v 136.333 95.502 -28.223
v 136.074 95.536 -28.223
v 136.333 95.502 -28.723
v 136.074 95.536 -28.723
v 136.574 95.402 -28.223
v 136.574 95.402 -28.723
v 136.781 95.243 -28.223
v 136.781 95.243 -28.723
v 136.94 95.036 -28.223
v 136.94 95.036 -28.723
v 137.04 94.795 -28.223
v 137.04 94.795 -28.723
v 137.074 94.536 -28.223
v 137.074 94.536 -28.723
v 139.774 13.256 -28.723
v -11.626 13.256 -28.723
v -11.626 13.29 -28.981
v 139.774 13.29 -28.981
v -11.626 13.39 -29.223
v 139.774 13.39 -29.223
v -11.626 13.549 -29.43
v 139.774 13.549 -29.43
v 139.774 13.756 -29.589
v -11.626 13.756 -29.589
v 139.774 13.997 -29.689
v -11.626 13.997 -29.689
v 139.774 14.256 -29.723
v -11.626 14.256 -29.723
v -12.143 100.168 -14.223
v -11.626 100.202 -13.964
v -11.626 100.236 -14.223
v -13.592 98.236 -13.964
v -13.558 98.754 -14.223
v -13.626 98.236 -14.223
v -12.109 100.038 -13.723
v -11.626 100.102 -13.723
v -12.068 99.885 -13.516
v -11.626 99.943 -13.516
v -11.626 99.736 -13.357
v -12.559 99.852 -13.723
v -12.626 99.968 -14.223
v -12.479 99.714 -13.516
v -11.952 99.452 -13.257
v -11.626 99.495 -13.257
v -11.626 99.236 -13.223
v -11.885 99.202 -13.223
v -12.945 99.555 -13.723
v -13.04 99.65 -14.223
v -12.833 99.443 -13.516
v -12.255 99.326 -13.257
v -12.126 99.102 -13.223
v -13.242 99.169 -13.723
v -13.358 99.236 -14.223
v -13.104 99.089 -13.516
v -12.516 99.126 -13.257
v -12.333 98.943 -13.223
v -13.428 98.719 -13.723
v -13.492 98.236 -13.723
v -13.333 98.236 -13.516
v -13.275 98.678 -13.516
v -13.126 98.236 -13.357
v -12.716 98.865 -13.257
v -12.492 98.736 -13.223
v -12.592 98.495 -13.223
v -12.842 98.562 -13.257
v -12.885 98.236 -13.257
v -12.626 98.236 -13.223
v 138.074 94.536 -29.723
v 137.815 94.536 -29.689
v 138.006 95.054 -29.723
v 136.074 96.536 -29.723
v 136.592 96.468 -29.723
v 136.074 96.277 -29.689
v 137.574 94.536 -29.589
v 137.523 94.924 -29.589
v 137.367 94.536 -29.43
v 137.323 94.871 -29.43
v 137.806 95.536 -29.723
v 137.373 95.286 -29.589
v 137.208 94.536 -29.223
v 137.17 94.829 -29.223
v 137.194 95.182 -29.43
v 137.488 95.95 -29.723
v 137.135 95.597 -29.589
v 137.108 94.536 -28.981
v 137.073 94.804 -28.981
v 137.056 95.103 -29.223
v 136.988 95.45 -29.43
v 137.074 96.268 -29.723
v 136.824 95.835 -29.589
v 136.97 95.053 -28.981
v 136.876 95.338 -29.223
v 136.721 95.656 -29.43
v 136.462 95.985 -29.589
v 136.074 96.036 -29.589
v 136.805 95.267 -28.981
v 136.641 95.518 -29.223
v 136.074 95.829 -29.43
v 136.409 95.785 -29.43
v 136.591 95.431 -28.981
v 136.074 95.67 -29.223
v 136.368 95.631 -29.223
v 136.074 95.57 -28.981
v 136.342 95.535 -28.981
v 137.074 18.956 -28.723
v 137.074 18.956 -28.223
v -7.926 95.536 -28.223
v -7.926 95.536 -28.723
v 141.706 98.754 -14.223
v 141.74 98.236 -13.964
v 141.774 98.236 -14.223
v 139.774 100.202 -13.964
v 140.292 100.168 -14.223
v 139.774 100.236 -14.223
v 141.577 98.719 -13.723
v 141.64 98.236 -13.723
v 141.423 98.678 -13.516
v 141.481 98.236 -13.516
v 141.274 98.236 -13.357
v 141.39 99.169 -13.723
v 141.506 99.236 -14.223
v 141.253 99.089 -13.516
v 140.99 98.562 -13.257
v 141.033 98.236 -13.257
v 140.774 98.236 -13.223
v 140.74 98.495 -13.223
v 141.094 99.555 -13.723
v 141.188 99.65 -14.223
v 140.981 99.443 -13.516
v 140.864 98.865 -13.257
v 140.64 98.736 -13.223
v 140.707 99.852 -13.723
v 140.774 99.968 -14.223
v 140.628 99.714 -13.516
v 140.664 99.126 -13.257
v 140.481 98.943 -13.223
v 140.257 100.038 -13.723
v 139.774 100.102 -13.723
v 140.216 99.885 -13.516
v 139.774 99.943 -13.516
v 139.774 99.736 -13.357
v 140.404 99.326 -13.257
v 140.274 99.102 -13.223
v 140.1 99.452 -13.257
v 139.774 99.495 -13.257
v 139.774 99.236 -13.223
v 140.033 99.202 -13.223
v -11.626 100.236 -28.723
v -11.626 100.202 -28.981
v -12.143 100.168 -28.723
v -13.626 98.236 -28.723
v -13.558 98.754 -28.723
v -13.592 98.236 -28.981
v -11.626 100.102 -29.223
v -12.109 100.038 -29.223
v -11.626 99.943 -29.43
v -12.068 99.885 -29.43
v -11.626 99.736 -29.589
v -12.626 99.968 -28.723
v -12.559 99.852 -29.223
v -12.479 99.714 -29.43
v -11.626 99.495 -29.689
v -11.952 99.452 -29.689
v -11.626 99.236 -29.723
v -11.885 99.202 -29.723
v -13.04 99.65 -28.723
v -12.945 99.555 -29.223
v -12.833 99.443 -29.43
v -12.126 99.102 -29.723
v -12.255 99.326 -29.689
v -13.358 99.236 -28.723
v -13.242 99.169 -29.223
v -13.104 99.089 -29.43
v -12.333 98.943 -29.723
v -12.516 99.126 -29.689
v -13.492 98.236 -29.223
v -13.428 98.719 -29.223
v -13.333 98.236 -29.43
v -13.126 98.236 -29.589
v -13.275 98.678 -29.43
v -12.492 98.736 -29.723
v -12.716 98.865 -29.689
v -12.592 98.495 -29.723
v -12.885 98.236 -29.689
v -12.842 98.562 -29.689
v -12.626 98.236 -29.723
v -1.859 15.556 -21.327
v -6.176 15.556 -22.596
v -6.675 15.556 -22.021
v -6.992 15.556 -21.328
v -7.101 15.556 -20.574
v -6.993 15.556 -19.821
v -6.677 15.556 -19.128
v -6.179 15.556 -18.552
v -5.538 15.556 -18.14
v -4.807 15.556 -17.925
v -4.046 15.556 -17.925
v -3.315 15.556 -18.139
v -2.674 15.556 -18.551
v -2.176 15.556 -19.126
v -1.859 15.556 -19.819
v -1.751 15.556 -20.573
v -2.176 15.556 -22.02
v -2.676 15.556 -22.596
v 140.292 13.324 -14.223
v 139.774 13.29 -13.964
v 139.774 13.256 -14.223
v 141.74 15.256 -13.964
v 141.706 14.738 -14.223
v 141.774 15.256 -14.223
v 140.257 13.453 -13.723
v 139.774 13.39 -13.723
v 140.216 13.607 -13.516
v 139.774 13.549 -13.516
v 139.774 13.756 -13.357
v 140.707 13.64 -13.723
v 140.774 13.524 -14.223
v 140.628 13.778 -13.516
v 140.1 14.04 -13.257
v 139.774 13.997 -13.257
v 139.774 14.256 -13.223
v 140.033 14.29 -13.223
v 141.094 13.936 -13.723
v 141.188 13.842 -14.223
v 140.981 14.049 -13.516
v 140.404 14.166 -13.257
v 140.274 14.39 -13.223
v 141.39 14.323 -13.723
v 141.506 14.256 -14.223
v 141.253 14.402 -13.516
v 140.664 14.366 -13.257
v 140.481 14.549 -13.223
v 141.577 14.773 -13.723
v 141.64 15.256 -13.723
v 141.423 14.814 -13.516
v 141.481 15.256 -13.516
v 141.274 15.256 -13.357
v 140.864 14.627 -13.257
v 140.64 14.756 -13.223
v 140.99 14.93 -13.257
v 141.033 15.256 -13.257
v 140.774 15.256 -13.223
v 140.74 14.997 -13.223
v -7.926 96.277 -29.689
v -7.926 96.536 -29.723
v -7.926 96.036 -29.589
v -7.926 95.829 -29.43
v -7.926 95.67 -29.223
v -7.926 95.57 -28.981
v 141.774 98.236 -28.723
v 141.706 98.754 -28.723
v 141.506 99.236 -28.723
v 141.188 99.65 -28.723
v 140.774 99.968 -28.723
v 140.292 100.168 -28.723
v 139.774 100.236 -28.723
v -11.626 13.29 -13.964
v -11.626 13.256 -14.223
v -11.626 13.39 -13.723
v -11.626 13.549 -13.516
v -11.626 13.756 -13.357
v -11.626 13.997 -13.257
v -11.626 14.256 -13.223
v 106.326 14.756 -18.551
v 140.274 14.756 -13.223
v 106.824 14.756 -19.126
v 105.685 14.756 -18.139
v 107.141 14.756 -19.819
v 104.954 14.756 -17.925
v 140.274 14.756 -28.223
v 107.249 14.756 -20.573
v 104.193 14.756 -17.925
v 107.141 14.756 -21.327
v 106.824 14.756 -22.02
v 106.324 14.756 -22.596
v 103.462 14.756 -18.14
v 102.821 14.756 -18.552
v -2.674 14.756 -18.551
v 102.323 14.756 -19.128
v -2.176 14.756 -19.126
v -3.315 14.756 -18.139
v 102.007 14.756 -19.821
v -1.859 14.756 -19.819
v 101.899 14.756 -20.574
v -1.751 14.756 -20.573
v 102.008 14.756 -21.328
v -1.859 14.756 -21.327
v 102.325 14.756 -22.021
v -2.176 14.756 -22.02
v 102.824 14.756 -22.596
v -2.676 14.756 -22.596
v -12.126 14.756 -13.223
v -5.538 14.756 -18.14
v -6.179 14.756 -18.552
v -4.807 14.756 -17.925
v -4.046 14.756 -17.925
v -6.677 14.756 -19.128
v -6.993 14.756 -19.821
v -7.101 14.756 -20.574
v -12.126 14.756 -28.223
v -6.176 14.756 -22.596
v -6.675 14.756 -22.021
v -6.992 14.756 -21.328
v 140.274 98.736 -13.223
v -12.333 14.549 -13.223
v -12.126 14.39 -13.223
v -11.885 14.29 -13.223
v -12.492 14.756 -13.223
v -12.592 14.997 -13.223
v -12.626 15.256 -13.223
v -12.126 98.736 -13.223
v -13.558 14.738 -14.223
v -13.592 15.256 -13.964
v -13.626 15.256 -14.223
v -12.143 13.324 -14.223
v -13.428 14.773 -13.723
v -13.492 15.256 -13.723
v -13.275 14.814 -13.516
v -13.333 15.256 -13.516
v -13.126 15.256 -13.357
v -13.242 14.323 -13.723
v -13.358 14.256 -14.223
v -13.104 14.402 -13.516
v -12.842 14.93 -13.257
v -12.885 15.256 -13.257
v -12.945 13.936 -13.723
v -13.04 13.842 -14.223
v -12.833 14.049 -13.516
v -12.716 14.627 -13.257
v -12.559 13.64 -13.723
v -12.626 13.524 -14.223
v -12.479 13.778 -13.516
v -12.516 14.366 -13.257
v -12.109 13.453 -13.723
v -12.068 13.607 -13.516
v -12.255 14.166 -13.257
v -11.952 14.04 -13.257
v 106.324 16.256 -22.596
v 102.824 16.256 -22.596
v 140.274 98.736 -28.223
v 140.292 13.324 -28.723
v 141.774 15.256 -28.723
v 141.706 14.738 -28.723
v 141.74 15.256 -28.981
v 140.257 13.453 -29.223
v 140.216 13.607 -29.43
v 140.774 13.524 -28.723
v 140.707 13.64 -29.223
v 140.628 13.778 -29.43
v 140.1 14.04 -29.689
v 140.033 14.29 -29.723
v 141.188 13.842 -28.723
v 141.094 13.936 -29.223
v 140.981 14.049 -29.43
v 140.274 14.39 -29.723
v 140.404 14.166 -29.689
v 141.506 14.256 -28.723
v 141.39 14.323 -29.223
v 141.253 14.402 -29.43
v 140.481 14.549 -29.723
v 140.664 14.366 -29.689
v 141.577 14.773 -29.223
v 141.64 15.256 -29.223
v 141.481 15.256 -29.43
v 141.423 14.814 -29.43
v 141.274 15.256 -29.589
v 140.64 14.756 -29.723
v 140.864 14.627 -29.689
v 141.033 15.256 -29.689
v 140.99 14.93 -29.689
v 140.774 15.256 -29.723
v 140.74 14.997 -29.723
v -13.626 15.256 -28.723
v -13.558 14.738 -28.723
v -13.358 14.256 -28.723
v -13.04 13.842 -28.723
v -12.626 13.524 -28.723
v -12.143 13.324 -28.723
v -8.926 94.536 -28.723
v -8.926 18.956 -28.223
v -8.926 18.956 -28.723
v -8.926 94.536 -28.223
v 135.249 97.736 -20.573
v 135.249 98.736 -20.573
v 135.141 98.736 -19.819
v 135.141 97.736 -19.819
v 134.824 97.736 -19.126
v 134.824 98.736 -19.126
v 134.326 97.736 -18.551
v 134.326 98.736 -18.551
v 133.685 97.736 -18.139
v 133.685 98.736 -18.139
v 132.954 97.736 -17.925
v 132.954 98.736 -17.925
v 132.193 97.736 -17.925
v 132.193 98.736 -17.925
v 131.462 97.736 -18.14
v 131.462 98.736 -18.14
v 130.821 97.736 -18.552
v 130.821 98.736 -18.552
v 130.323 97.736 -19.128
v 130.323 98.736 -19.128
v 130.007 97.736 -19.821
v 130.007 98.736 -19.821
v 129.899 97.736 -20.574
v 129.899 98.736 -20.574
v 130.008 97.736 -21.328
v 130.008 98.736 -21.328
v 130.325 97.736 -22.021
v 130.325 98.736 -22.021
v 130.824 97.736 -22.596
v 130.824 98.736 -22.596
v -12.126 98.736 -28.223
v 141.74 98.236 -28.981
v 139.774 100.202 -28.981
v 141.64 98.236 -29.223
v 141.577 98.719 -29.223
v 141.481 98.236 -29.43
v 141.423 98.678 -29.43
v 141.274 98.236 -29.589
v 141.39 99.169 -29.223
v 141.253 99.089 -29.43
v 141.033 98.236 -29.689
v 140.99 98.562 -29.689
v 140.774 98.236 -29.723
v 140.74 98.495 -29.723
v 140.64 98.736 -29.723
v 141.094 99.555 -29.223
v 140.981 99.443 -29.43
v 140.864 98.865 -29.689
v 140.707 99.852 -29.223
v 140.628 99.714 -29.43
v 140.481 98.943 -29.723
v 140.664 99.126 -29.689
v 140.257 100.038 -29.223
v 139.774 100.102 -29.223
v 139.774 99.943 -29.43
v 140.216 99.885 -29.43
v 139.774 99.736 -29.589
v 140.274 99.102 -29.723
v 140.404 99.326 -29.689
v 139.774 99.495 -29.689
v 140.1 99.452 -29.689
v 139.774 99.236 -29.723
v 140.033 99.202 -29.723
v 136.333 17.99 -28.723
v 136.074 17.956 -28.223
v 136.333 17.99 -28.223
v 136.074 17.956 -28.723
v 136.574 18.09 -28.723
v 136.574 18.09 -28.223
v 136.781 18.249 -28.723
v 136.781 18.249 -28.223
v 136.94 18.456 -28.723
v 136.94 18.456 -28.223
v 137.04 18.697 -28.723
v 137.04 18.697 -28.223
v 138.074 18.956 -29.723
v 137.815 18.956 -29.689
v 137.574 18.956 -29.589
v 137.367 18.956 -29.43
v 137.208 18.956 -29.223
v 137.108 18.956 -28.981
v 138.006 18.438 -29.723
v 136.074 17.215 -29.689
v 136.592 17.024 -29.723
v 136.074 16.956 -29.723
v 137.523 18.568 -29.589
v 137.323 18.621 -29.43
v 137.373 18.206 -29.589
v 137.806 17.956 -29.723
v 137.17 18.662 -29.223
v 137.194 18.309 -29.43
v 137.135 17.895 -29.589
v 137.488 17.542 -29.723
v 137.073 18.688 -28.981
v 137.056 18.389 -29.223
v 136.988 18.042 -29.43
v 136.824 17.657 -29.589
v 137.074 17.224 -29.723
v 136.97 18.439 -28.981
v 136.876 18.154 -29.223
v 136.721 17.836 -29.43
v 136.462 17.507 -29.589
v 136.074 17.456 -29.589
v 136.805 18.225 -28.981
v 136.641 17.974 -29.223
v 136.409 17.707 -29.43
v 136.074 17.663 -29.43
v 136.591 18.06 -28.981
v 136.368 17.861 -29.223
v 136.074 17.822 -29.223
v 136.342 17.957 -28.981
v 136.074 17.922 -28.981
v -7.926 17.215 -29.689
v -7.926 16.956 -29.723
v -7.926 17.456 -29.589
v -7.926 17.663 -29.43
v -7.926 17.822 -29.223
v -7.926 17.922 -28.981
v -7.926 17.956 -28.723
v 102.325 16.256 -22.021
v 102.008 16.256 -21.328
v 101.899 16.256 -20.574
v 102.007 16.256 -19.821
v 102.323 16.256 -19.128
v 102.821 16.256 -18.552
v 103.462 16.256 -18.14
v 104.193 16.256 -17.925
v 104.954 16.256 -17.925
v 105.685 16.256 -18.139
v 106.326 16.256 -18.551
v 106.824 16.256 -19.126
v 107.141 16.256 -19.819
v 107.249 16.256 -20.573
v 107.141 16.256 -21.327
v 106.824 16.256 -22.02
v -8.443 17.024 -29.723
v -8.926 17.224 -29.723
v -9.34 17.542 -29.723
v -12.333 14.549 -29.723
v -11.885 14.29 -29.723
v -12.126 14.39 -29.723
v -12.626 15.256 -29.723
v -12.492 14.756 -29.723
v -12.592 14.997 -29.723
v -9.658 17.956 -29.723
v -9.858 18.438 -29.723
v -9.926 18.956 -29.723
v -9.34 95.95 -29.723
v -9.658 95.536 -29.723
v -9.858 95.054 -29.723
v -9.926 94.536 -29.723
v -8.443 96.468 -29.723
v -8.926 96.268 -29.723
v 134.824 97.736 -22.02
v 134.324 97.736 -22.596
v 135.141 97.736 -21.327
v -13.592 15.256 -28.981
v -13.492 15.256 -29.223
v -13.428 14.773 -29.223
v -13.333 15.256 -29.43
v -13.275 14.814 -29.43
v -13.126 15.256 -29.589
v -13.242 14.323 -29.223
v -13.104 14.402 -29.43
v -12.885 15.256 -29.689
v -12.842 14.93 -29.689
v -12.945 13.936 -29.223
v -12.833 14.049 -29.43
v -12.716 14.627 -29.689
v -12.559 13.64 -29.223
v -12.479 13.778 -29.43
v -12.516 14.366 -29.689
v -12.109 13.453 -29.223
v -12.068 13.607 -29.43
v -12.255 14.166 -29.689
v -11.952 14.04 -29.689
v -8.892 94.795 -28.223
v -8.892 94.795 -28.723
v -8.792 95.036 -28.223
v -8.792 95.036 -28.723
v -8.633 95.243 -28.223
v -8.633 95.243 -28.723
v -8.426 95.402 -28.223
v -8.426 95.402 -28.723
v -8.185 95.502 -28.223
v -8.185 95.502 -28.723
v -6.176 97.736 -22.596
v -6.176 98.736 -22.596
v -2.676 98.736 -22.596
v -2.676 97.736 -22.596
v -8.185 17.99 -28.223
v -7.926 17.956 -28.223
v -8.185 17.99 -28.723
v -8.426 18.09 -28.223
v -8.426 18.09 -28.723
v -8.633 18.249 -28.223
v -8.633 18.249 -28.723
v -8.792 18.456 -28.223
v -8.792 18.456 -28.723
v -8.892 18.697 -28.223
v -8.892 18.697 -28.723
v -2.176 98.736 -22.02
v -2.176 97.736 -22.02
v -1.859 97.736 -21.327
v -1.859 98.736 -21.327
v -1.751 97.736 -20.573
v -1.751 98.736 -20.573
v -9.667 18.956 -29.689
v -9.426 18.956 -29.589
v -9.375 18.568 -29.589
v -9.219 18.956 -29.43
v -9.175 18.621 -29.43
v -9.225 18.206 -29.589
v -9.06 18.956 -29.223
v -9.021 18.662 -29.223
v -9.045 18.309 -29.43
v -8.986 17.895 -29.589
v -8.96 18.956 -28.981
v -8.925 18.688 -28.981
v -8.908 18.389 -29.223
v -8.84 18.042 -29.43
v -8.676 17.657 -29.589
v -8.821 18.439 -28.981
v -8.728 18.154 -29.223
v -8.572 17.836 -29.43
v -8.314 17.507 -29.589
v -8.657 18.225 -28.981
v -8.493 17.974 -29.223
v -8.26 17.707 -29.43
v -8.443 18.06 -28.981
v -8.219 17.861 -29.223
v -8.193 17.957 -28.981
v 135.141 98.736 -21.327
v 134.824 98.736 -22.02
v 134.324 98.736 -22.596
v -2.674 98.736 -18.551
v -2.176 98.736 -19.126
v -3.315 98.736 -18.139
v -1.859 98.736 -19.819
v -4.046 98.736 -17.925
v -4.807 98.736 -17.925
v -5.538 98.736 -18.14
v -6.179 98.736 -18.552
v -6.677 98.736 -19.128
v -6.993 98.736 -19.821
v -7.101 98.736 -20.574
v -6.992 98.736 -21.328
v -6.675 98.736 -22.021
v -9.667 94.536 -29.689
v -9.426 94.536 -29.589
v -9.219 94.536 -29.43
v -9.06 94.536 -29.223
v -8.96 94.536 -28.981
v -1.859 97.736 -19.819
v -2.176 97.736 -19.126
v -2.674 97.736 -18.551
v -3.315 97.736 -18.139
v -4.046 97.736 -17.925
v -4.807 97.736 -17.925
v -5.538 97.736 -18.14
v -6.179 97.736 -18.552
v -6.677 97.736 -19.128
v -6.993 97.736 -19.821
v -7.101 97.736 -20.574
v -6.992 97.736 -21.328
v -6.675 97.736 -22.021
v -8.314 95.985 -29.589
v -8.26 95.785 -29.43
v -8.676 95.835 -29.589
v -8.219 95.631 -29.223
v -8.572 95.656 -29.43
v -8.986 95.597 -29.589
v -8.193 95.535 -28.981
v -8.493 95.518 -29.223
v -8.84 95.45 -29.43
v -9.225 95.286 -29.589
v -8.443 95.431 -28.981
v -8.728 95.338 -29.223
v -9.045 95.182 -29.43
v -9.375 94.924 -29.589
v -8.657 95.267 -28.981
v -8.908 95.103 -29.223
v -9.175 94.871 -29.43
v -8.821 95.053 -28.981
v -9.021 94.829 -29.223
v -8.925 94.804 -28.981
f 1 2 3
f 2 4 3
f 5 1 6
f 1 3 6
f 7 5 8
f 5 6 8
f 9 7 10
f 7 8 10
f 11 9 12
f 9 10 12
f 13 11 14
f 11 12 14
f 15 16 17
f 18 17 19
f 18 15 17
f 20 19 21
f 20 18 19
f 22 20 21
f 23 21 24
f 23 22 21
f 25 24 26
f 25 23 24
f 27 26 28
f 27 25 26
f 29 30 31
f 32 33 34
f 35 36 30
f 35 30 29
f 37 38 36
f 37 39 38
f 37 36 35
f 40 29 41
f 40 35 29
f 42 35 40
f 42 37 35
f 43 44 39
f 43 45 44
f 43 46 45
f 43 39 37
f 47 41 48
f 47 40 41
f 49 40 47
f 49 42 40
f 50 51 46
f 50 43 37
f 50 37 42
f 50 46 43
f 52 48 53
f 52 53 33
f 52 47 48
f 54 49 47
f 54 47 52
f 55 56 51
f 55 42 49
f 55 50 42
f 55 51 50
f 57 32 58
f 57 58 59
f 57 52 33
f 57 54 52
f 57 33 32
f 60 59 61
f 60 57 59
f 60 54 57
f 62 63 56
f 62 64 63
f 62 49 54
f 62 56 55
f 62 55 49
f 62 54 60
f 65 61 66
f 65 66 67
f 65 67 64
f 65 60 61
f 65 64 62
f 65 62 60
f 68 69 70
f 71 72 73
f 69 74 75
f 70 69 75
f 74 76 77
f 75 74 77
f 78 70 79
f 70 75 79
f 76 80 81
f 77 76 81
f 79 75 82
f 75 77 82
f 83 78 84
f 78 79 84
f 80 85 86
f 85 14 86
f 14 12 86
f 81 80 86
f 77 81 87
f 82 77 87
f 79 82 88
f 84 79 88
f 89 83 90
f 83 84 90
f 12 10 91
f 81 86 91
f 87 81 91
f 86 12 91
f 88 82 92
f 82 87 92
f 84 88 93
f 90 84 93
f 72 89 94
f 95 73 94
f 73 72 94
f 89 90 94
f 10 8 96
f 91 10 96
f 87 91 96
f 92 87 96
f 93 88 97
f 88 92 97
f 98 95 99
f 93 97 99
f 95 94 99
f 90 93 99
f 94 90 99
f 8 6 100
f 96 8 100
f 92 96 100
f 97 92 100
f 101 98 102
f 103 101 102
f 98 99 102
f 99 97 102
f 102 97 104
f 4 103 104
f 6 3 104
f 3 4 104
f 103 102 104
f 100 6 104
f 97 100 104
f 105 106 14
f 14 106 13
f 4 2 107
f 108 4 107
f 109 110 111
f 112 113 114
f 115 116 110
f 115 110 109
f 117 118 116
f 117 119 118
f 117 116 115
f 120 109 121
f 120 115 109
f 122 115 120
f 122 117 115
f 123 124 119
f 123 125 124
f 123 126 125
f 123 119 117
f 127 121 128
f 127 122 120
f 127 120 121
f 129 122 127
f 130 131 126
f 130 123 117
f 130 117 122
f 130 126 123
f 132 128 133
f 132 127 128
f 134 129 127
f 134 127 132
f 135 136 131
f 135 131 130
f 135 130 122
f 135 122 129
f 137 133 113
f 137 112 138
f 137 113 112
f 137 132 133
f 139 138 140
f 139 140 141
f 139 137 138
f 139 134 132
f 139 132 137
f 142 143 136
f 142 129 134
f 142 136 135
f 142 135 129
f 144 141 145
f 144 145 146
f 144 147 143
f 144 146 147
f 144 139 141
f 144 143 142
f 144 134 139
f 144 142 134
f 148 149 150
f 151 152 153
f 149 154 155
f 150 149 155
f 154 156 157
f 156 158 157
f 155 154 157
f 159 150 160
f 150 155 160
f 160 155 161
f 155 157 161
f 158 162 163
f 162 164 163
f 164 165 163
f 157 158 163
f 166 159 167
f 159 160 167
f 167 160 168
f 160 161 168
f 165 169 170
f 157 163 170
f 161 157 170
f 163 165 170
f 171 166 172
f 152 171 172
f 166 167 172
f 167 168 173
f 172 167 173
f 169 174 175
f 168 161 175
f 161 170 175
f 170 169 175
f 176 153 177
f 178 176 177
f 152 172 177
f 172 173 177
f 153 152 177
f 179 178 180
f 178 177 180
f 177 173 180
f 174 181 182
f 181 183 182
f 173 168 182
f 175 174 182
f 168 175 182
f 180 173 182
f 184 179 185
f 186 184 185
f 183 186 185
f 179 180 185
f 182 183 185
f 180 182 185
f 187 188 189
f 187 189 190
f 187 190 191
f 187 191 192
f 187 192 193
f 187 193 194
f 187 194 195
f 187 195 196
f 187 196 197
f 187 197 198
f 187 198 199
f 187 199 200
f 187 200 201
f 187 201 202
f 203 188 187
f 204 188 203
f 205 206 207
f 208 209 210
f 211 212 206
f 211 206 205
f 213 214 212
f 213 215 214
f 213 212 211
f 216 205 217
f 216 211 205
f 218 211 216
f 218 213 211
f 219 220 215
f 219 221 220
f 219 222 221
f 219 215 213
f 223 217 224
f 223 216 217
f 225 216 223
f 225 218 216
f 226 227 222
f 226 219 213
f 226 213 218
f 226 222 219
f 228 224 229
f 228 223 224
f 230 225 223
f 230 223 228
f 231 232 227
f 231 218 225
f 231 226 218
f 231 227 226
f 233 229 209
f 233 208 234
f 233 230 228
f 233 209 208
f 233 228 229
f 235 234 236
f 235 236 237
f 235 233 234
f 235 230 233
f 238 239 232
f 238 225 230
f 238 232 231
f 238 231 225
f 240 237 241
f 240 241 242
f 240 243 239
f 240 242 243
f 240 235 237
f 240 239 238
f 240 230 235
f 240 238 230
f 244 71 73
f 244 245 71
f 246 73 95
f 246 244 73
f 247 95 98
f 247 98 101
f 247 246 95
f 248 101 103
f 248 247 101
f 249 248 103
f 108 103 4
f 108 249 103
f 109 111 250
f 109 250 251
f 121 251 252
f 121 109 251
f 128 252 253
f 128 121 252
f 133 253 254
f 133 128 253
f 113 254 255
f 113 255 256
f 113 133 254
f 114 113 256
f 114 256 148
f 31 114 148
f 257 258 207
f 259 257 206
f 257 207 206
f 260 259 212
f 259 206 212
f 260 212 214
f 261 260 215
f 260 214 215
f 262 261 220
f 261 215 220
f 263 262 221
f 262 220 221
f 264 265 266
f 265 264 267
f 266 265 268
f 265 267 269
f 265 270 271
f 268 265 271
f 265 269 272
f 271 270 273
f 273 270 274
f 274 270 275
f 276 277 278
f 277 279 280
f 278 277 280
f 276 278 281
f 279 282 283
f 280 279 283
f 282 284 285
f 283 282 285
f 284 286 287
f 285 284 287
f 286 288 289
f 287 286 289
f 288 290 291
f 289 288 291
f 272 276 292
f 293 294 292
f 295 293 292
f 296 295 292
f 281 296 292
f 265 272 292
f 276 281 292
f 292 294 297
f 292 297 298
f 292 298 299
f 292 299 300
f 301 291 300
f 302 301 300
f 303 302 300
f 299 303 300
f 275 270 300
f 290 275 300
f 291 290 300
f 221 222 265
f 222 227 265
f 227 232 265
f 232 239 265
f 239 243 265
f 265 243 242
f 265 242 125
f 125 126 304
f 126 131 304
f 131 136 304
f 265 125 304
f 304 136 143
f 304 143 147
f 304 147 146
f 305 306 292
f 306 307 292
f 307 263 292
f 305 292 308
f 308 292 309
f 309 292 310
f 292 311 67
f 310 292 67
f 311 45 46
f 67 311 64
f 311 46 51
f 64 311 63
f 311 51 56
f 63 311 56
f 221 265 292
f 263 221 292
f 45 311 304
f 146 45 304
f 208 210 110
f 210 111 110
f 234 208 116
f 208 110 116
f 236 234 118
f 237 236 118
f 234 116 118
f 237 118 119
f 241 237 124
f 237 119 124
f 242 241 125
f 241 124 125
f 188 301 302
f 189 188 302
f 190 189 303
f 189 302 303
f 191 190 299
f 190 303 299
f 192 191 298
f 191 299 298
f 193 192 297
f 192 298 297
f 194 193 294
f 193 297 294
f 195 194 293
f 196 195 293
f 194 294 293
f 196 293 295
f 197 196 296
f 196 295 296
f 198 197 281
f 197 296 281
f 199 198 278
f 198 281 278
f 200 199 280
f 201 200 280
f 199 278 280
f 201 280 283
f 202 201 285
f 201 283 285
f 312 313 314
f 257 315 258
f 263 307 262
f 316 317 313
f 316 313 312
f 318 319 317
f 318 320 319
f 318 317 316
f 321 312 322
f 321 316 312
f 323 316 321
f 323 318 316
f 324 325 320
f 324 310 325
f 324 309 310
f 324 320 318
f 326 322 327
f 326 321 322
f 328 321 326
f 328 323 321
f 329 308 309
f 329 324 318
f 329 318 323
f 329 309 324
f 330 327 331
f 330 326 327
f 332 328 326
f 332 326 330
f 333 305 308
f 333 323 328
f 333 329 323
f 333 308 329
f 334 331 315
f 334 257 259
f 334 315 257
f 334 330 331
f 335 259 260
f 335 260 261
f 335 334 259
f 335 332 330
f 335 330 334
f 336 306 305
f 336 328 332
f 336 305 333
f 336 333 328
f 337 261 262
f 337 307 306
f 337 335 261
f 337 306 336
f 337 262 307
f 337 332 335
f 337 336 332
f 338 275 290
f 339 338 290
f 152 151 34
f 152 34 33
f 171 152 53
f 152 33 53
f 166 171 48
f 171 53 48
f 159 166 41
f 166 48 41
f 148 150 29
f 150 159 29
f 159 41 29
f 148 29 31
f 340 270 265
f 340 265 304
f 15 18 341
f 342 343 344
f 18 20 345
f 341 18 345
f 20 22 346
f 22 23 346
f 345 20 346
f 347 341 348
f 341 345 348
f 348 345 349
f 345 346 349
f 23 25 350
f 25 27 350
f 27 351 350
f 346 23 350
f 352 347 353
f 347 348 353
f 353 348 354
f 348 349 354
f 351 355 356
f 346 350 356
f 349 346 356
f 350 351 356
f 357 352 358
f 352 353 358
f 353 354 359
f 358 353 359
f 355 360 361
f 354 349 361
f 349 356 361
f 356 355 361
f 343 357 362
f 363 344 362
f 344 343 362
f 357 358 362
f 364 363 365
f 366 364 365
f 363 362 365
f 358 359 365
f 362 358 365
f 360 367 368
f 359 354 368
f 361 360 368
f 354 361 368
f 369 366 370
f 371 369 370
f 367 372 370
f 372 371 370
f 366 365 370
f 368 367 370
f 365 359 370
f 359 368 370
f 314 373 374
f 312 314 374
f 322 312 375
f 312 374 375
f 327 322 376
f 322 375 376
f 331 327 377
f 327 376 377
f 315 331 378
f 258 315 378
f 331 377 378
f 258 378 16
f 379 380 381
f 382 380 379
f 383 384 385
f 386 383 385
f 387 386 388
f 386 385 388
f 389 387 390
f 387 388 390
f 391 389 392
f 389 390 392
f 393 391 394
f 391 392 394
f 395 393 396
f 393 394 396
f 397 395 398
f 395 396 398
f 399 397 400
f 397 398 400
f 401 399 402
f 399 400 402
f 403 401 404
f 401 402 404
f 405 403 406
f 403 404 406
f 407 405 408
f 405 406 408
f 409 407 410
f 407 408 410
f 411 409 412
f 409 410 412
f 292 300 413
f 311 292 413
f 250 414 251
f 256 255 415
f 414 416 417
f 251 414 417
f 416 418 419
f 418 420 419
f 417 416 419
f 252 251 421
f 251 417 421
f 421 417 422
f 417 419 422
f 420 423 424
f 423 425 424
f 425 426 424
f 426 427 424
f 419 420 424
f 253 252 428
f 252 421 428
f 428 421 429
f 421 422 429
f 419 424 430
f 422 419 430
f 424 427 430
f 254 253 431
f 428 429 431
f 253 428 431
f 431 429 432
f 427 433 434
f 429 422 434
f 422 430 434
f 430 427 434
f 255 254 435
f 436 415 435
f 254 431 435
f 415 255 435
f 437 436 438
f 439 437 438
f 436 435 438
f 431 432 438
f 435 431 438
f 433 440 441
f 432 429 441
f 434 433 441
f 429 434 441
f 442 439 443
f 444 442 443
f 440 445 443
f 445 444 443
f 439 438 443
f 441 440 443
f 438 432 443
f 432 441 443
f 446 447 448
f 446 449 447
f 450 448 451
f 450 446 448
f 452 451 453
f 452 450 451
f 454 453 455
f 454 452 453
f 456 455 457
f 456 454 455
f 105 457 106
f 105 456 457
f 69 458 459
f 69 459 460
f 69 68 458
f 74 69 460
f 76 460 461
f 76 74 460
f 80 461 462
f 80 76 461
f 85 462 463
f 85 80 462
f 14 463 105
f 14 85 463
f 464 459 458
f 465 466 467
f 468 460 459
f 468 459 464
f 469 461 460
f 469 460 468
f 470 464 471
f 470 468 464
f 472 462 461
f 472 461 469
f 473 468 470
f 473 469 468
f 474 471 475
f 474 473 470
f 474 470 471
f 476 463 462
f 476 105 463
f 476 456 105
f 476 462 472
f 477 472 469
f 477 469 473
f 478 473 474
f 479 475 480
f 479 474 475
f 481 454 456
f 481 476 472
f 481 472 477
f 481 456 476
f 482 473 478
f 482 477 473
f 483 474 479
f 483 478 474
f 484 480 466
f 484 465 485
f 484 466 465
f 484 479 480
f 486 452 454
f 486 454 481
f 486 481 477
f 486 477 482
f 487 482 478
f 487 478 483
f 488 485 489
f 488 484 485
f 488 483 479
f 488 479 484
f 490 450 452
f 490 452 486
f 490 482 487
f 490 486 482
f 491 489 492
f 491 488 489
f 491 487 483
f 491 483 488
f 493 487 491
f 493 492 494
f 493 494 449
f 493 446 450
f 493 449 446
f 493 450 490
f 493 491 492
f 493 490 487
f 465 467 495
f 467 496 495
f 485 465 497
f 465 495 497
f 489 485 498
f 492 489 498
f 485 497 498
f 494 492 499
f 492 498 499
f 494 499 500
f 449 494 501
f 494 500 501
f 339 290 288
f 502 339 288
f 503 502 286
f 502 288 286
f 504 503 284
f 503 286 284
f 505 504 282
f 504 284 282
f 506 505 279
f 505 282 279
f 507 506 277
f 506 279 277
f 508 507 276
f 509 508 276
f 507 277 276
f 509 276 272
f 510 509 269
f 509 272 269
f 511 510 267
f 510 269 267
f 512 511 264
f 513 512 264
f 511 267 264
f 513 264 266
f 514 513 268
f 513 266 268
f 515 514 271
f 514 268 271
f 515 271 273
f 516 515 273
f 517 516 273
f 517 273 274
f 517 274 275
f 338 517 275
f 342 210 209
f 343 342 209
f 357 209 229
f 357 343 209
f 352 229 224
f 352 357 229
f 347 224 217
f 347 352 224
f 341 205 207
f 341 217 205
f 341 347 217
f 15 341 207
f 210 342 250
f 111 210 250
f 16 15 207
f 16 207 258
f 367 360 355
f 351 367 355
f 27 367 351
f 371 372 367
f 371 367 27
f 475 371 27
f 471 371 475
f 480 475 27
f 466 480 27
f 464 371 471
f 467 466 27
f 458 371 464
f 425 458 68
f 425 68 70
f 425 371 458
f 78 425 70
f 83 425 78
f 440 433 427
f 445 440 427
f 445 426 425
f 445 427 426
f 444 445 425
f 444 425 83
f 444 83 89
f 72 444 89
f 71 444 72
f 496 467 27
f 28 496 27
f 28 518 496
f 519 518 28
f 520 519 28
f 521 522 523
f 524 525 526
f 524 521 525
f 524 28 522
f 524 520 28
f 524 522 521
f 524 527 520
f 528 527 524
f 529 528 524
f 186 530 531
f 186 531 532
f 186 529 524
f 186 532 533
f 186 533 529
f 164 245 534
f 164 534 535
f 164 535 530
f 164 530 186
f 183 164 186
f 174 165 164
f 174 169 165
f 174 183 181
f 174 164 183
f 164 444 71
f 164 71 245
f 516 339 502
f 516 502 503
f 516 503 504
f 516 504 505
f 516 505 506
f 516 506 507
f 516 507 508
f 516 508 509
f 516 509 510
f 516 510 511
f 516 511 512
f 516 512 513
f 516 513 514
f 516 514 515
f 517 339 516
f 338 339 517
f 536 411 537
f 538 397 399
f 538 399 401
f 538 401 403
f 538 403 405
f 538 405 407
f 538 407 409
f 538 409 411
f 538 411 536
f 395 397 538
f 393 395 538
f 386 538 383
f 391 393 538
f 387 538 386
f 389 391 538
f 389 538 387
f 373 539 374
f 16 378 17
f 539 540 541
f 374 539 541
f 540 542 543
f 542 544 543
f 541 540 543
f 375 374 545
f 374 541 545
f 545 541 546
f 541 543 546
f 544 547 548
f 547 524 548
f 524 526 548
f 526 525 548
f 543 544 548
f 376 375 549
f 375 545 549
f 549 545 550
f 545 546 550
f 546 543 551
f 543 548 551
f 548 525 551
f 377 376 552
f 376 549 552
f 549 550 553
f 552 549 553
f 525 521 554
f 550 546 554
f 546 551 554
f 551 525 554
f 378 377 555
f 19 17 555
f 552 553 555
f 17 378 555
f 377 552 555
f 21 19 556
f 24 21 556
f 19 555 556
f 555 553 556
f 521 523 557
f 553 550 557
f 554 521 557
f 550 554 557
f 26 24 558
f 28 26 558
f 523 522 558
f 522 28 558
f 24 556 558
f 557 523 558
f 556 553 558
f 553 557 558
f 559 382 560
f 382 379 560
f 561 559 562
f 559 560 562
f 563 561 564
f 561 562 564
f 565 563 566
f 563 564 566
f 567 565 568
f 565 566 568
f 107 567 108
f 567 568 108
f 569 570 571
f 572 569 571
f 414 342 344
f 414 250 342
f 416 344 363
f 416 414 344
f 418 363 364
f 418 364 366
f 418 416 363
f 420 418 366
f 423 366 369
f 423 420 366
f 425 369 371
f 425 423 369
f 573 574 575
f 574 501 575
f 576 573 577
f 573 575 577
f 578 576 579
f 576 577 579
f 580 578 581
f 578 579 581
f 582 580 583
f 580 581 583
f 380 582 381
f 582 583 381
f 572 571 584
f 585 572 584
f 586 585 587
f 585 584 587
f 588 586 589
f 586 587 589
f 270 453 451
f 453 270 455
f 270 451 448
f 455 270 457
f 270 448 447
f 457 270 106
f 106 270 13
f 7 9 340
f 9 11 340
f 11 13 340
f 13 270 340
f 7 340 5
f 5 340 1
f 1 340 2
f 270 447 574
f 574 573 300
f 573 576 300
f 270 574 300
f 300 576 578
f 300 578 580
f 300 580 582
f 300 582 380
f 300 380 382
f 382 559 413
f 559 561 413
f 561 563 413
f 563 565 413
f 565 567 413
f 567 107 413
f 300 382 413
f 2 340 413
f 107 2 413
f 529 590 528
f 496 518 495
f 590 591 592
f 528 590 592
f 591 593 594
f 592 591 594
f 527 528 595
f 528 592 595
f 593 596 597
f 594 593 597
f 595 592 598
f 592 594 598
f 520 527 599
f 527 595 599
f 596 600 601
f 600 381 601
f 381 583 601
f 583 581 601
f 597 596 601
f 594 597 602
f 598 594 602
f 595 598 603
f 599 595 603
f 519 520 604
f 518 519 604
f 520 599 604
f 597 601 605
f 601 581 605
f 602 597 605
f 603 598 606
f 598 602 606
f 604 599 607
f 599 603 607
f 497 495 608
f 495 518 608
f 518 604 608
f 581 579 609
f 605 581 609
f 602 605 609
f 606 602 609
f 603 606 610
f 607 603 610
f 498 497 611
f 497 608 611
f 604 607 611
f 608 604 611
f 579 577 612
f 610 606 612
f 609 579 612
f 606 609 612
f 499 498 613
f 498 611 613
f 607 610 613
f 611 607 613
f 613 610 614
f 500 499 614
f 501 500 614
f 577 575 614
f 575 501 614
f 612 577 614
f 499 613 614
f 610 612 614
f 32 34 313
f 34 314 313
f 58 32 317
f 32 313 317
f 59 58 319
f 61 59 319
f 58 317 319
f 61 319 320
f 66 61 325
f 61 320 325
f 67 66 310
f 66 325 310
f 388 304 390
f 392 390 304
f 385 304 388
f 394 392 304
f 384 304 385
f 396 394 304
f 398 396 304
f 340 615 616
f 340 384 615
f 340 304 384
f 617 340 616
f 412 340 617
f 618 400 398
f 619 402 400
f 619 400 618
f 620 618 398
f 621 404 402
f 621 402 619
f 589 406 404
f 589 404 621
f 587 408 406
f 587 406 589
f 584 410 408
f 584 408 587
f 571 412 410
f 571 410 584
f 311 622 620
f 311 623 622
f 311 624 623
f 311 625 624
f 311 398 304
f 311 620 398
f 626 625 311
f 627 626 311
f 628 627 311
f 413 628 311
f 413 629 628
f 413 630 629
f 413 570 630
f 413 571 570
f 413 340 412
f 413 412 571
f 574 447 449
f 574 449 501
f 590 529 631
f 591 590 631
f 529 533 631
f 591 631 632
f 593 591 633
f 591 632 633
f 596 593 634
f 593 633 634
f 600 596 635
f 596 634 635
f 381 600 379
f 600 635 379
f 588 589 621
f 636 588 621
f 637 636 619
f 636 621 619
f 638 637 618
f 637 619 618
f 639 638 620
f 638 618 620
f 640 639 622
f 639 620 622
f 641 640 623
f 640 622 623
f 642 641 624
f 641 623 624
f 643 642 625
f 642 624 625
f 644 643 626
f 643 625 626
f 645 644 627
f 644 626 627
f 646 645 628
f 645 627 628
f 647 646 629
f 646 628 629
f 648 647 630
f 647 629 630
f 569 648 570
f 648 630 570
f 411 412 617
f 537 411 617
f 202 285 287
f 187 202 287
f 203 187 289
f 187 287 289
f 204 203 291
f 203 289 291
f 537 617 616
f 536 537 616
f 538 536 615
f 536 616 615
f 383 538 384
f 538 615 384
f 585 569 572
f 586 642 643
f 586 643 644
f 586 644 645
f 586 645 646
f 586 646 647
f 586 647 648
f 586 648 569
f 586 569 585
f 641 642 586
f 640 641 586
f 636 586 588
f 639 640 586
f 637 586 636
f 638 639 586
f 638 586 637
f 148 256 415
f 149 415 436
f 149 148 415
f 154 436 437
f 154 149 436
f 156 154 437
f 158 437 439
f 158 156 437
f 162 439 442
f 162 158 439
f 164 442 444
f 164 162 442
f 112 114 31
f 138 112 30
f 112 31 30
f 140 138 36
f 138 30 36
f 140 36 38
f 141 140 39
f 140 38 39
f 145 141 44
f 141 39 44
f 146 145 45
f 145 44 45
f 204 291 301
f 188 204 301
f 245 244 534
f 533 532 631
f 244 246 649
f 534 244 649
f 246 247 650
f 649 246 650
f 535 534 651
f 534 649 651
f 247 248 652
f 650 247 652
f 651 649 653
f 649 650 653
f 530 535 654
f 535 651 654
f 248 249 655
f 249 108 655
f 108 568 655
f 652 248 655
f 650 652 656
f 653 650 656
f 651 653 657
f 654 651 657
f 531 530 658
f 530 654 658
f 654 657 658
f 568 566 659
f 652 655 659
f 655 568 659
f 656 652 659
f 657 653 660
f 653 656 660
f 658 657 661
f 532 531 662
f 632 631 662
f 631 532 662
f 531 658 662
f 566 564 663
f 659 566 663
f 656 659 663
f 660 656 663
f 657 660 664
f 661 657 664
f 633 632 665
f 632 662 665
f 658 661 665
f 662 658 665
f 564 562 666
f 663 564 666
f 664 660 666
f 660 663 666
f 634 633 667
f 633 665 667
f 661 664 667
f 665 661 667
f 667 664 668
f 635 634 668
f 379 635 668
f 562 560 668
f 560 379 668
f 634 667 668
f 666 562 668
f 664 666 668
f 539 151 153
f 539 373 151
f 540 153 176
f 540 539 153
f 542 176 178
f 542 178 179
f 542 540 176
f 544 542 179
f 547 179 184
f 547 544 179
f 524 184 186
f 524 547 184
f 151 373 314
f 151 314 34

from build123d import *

# Parameters (mm, degrees)
SKETCH1_W           = 155.4
SKETCH1_H           = 86.98
SKETCH1_W_2         = 146
SKETCH1_H_2         = 77.58
BOSS_EXTRUDE2_DEPTH = 1.5
SKETCH1_4_W         = 155.4
SKETCH1_4_H         = 86.98
SKETCH1_4_W_2       = 152.4
SKETCH1_4_H_2       = 83.98
BOSS_EXTRUDE3_DEPTH = 15
FILLET1_R           = 2
FILLET2_R           = 1
FILLET3_R           = 1
BOSS_EXTRUDE4_DEPTH = 0.8
BOSS_EXTRUDE5_START = 1
BOSS_EXTRUDE5_DEPTH = 1
BOSS_EXTRUDE6_DEPTH = 1.5


with BuildPart() as part:
    # Sketch1 → Boss-Extrude2 (new body)
    with BuildSketch(Plane(origin=(0, 0, -28.222648695), x_dir=(-1, 0, 0), z_dir=(0, 0, -1))):
        with Locations((-64.074179317, 56.745922466)):
            Rectangle(SKETCH1_W, SKETCH1_H)
        with Locations((-64.074179317, 56.745922466)):
            Rectangle(SKETCH1_W_2, SKETCH1_H_2, mode=Mode.SUBTRACT)
    extrude(amount=BOSS_EXTRUDE2_DEPTH)

    # Sketch1<4> → Boss-Extrude3 (add)
    with BuildSketch(Plane(origin=(0, 0, -28.222648695), x_dir=(-1, 0, 0), z_dir=(0, 0, -1))):
        with Locations((-64.074179317, 56.745922466)):
            Rectangle(SKETCH1_4_W, SKETCH1_4_H)
        with Locations((-64.074179317, 56.745922466)):
            Rectangle(SKETCH1_4_W_2, SKETCH1_4_H_2, mode=Mode.SUBTRACT)
    extrude(amount=-BOSS_EXTRUDE3_DEPTH)

    # Fillet1
    fillet1_edges = [part.edges().sort_by_distance(p)[0] for p in [
        (141.774179317, 100.235922466, -21.472648695),
        (-13.625820683, 100.235922466, -21.472648695),
        (-13.625820683, 13.255922466, -21.472648695),
        (141.774179317, 13.255922466, -21.472648695),
    ]]
    fillet(fillet1_edges, radius=FILLET1_R)

    # Fillet2
    fillet2_edges = [part.edges().sort_by_distance(p)[0] for p in [
        (-8.925820683, 56.745922466, -29.722648695),
        (64.074179317, 95.535922466, -29.722648695),
        (64.074179317, 17.955922466, -29.722648695),
        (141.188392879, 99.650136028, -29.722648695),
        (64.074179317, 100.235922466, -29.722648695),
        (-13.040034245, 99.650136028, -29.722648695),
        (-13.625820683, 56.745922466, -29.722648695),
        (-13.040034245, 13.841708903, -29.722648695),
        (64.074179317, 13.255922466, -29.722648695),
        (141.188392879, 13.841708903, -29.722648695),
        (141.774179317, 56.745922466, -29.722648695),
        (137.074179317, 56.745922466, -29.722648695),
        (137.074179317, 95.535922466, -28.972648695),
        (137.074179317, 17.955922466, -28.972648695),
        (-8.925820683, 17.955922466, -28.972648695),
        (-8.925820683, 95.535922466, -28.972648695),
    ]]
    fillet(fillet2_edges, radius=FILLET2_R)

    # Fillet3
    fillet3_edges = [part.edges().sort_by_distance(p)[0] for p in [
        (141.188392879, 13.841708903, -13.222648695),
        (141.774179317, 56.745922466, -13.222648695),
        (141.188392879, 99.650136028, -13.222648695),
        (64.074179317, 100.235922466, -13.222648695),
        (-13.040034245, 99.650136028, -13.222648695),
        (-13.625820683, 56.745922466, -13.222648695),
        (-13.040034245, 13.841708903, -13.222648695),
        (64.074179317, 13.255922466, -13.222648695),
    ]]
    fillet(fillet3_edges, radius=FILLET3_R)

    # Sketch2 → Boss-Extrude4 (add)
    with BuildSketch(Plane(origin=(0, 14.755922466, 0), x_dir=(1, 0, 0), z_dir=(0, 1, 0))):
        with BuildLine():
            Line((106.324179317, 22.595795996), (102.824179317, 22.595795996))
            ThreePointArc((102.824179317, 22.595795996), (104.574179317, 17.897648695), (106.324179317, 22.595795996))
        make_face()
        with BuildLine():
            Line((-2.675820683, 22.595795996), (-6.175820683, 22.595795996))
            ThreePointArc((-6.175820683, 22.595795996), (-4.425820683, 17.897648695), (-2.675820683, 22.595795996))
        make_face()
    extrude(amount=BOSS_EXTRUDE4_DEPTH)

    # Sketch4 → Boss-Extrude5 (add)
    with BuildSketch(Plane.XZ.offset(-98.735922466).offset(BOSS_EXTRUDE5_START)):
        with BuildLine():
            ThreePointArc((134.324179317, -22.595795996), (132.574179317, -17.897648695), (130.824179317, -22.595795996))
            Line((130.824179317, -22.595795996), (134.324179317, -22.595795996))
        make_face()
        with BuildLine():
            ThreePointArc((-2.675820683, -22.595795996), (-4.425820683, -17.897648695), (-6.175820683, -22.595795996))
            Line((-6.175820683, -22.595795996), (-2.675820683, -22.595795996))
        make_face()
    extrude(amount=-BOSS_EXTRUDE5_DEPTH)

    # Sketch2<3> → Boss-Extrude6 (add)
    with BuildSketch(Plane(origin=(0, 14.755922466, 0), x_dir=(1, 0, 0), z_dir=(0, 1, 0))):
        with BuildLine():
            Line((106.324179317, 22.595795996), (102.824179317, 22.595795996))
            ThreePointArc((102.824179317, 22.595795996), (103.461890011, 18.139864796), (107.249179317, 20.572648695))
            ThreePointArc((107.249179317, 20.572648695), (107.006963216, 21.684938001), (106.324179317, 22.595795996))
        make_face()
    extrude(amount=BOSS_EXTRUDE6_DEPTH)


solid = part.part
